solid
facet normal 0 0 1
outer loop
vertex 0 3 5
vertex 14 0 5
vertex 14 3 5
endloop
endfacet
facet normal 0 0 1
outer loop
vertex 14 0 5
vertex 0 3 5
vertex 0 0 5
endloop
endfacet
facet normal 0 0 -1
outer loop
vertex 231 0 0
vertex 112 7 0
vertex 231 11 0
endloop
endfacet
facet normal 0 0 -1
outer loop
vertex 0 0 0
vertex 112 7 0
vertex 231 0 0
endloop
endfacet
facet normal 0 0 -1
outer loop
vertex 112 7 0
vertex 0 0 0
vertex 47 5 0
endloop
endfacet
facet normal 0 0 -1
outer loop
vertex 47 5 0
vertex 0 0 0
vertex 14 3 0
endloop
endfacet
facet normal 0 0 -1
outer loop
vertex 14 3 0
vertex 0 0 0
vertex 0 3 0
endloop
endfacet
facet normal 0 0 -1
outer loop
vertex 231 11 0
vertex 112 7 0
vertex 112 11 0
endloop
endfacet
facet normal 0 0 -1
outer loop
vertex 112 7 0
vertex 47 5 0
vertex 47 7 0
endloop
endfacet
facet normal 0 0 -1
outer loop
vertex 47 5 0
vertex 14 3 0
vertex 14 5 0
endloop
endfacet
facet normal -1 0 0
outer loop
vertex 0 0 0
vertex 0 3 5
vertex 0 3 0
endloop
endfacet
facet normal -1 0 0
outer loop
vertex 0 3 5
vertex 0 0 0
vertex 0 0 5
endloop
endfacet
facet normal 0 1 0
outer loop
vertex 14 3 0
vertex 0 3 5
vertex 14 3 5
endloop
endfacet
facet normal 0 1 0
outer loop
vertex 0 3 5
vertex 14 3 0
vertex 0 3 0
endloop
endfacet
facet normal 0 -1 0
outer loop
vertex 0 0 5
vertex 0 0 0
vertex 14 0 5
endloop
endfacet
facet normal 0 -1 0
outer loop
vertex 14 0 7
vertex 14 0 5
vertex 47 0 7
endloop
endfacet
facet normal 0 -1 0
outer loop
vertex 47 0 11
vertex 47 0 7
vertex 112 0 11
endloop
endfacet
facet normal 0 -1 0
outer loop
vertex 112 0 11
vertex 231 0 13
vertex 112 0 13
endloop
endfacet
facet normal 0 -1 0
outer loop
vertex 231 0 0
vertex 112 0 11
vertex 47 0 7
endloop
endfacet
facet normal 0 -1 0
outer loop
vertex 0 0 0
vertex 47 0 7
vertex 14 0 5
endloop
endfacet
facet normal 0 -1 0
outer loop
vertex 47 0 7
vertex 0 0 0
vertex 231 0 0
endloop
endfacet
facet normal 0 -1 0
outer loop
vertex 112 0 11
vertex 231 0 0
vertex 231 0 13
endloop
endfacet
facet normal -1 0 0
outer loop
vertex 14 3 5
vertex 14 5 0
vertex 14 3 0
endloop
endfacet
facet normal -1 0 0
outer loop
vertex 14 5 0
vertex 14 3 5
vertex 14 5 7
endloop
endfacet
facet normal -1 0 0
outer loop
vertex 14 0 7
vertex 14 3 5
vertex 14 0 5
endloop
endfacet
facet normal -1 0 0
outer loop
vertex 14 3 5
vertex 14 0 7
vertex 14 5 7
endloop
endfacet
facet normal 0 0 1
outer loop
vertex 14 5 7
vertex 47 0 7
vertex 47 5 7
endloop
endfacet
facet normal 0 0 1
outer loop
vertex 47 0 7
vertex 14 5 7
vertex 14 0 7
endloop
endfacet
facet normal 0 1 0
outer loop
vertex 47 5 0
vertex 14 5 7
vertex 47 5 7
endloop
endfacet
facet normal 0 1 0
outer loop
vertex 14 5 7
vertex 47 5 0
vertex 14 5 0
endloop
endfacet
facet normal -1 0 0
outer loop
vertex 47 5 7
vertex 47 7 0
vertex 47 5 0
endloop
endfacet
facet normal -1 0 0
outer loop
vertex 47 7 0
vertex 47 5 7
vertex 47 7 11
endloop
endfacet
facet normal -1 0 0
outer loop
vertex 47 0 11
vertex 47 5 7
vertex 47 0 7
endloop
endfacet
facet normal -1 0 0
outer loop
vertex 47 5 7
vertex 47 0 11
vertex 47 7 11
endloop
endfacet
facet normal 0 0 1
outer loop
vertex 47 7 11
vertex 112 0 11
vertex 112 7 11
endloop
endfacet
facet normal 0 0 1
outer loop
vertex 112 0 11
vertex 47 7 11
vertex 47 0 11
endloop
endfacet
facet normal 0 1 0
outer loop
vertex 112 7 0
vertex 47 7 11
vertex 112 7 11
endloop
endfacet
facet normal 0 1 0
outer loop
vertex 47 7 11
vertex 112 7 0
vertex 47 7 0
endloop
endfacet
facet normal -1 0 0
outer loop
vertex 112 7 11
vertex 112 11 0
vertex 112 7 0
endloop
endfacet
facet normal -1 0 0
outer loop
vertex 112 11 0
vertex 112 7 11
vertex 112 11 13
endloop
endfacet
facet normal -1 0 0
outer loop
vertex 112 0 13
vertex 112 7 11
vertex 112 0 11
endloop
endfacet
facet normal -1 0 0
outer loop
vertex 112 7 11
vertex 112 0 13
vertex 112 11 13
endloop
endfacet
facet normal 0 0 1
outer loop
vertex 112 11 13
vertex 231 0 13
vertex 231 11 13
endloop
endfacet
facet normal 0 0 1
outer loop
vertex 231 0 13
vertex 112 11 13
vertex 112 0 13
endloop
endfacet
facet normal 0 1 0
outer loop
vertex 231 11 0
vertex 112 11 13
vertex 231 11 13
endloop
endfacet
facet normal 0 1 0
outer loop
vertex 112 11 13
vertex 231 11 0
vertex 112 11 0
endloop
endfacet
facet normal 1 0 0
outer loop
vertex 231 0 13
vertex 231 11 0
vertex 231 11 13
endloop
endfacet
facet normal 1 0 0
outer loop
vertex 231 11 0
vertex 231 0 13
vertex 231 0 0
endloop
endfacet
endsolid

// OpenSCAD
translate([1.0, 1.5, 2.5]) color([0.8918421087116969, 0.42205651792049836, 0.08403205823715598]) cube([2, 3, 5], center=true);
translate([3.0, 1.5, 2.5]) color([0.1047646210762947, 0.06292282863863541, 0.4151614515022839]) cube([2, 3, 5], center=true);
translate([5.0, 1.5, 2.5]) color([0.15615697007089357, 0.9545538427732947, 0.7913428503775491]) cube([2, 3, 5], center=true);
translate([7.0, 1.5, 2.5]) color([0.43108631436838285, 0.41701950900356644, 0.4966247746294912]) cube([2, 3, 5], center=true);
translate([9.0, 1.5, 2.5]) color([0.86405767472269, 0.32449912818180593, 0.25258592574699623]) cube([2, 3, 5], center=true);
translate([11.0, 1.5, 2.5]) color([0.35250302456564797, 0.12137799977699892, 0.691775150815975]) cube([2, 3, 5], center=true);
translate([13.0, 1.5, 2.5]) color([0.34544510653523897, 0.17790766067776254, 0.830270051764872]) cube([2, 3, 5], center=true);
translate([15.5, 2.5, 3.5]) color([0.23049353673314077, 0.3658024748453319, 0.5965890354919068]) cube([3, 5, 7], center=true);
translate([18.5, 2.5, 3.5]) color([0.14329113966210216, 0.003232100641658797, 0.6590184917581017]) cube([3, 5, 7], center=true);
translate([21.5, 2.5, 3.5]) color([0.7321014772226084, 0.9009039411186286, 0.7479768172441763]) cube([3, 5, 7], center=true);
translate([24.5, 2.5, 3.5]) color([0.29326295382626455, 0.6894664766240866, 0.932788033819558]) cube([3, 5, 7], center=true);
translate([27.5, 2.5, 3.5]) color([0.23286310478430694, 0.14188743522012004, 0.4540480681686925]) cube([3, 5, 7], center=true);
translate([30.5, 2.5, 3.5]) color([0.4766939084563374, 0.7074804824528956, 0.2582188407343454]) cube([3, 5, 7], center=true);
translate([33.5, 2.5, 3.5]) color([0.027936242271358158, 0.20812012525081536, 0.33501316214628807]) cube([3, 5, 7], center=true);
translate([36.5, 2.5, 3.5]) color([0.9609071038114427, 0.29634664160852753, 0.8784103092413238]) cube([3, 5, 7], center=true);
translate([39.5, 2.5, 3.5]) color([0.5532045188241876, 0.32698413866792275, 0.5930193960141523]) cube([3, 5, 7], center=true);
translate([42.5, 2.5, 3.5]) color([0.08080901281968078, 0.5332278801564081, 0.30776249733867533]) cube([3, 5, 7], center=true);
translate([45.5, 2.5, 3.5]) color([0.3765889324074634, 0.14692685712634312, 0.1252359956830017]) cube([3, 5, 7], center=true);
translate([49.5, 3.5, 5.5]) color([0.2228174233130471, 0.5083324480268261, 0.23665719296677712]) cube([5, 7, 11], center=true);
translate([54.5, 3.5, 5.5]) color([0.18394442119493715, 0.3724619255943996, 0.6631955135334705]) cube([5, 7, 11], center=true);
translate([59.5, 3.5, 5.5]) color([0.8609746033864751, 0.6012082175951422, 0.3938011681878649]) cube([5, 7, 11], center=true);
translate([64.5, 3.5, 5.5]) color([0.7021695231885549, 0.13202027544551864, 0.29938666187805807]) cube([5, 7, 11], center=true);
translate([69.5, 3.5, 5.5]) color([0.4167493264442593, 0.9263964007964989, 0.5910765187605377]) cube([5, 7, 11], center=true);
translate([74.5, 3.5, 5.5]) color([0.2980281087530109, 0.35456411603507165, 0.24805850121983253]) cube([5, 7, 11], center=true);
translate([79.5, 3.5, 5.5]) color([0.6327789974902275, 0.6370445113549524, 0.5292072971005523]) cube([5, 7, 11], center=true);
translate([84.5, 3.5, 5.5]) color([0.376431751315491, 0.008427608141492793, 0.9619565585865117]) cube([5, 7, 11], center=true);
translate([89.5, 3.5, 5.5]) color([0.901262330417864, 0.44129738363616366, 0.3715965769686672]) cube([5, 7, 11], center=true);
translate([94.5, 3.5, 5.5]) color([0.9523409342086877, 0.09105648808381206, 0.18545820412424963]) cube([5, 7, 11], center=true);
translate([99.5, 3.5, 5.5]) color([0.10861526636012075, 0.11215874223546374, 0.6055458611860893]) cube([5, 7, 11], center=true);
translate([104.5, 3.5, 5.5]) color([0.15387883630139487, 0.7025980908137885, 0.928268212070889]) cube([5, 7, 11], center=true);
translate([109.5, 3.5, 5.5]) color([0.18538068806857422, 0.42170431041506296, 0.1747372019883816]) cube([5, 7, 11], center=true);
translate([115.5, 5.5, 6.5]) color([0.9595322940755414, 0.3403879026852894, 0.5233486454380116]) cube([7, 11, 13], center=true);
translate([122.5, 5.5, 6.5]) color([0.35536744790103547, 0.6315169232882821, 0.08649939658707362]) cube([7, 11, 13], center=true);
translate([129.5, 5.5, 6.5]) color([0.7550350740823142, 0.2947283238309857, 0.8301737658604361]) cube([7, 11, 13], center=true);
translate([136.5, 5.5, 6.5]) color([0.4490883769000732, 0.4620108455998946, 0.2187341846418389]) cube([7, 11, 13], center=true);
translate([143.5, 5.5, 6.5]) color([0.11445722556586746, 0.9788025142917065, 0.3011589686960586]) cube([7, 11, 13], center=true);
translate([150.5, 5.5, 6.5]) color([0.6091605287508749, 0.4242090709976407, 0.7513524999576429]) cube([7, 11, 13], center=true);
translate([157.5, 5.5, 6.5]) color([0.09255304692818778, 0.4976795968420046, 0.9609180855182016]) cube([7, 11, 13], center=true);
translate([164.5, 5.5, 6.5]) color([0.5437408220916614, 0.405305104554358, 0.6320656015278037]) cube([7, 11, 13], center=true);
translate([171.5, 5.5, 6.5]) color([0.0216193804206819, 0.2700784048715086, 0.6684886667173141]) cube([7, 11, 13], center=true);
translate([178.5, 5.5, 6.5]) color([0.0002532098932251925, 0.3984286079265319, 0.8905618085087551]) cube([7, 11, 13], center=true);
translate([185.5, 5.5, 6.5]) color([0.7099647178965433, 0.4445845492335537, 0.7465509493098265]) cube([7, 11, 13], center=true);
translate([192.5, 5.5, 6.5]) color([0.35382203223851694, 0.8712980207444939, 0.6725473918674463]) cube([7, 11, 13], center=true);
translate([199.5, 5.5, 6.5]) color([0.19603088941730495, 0.08525923665948931, 0.0704556688087915]) cube([7, 11, 13], center=true);
translate([206.5, 5.5, 6.5]) color([0.26248678792717994, 0.533638651221174, 0.11818482376773232]) cube([7, 11, 13], center=true);
translate([213.5, 5.5, 6.5]) color([0.8594532404023933, 0.8906989166138923, 0.7620005545284954]) cube([7, 11, 13], center=true);
translate([220.5, 5.5, 6.5]) color([0.06809296768032302, 0.8609410769469436, 0.2827478909480132]) cube([7, 11, 13], center=true);
translate([227.5, 5.5, 6.5]) color([0.13442052583382869, 0.5230599837537087, 0.21027834364306774]) cube([7, 11, 13], center=true);
